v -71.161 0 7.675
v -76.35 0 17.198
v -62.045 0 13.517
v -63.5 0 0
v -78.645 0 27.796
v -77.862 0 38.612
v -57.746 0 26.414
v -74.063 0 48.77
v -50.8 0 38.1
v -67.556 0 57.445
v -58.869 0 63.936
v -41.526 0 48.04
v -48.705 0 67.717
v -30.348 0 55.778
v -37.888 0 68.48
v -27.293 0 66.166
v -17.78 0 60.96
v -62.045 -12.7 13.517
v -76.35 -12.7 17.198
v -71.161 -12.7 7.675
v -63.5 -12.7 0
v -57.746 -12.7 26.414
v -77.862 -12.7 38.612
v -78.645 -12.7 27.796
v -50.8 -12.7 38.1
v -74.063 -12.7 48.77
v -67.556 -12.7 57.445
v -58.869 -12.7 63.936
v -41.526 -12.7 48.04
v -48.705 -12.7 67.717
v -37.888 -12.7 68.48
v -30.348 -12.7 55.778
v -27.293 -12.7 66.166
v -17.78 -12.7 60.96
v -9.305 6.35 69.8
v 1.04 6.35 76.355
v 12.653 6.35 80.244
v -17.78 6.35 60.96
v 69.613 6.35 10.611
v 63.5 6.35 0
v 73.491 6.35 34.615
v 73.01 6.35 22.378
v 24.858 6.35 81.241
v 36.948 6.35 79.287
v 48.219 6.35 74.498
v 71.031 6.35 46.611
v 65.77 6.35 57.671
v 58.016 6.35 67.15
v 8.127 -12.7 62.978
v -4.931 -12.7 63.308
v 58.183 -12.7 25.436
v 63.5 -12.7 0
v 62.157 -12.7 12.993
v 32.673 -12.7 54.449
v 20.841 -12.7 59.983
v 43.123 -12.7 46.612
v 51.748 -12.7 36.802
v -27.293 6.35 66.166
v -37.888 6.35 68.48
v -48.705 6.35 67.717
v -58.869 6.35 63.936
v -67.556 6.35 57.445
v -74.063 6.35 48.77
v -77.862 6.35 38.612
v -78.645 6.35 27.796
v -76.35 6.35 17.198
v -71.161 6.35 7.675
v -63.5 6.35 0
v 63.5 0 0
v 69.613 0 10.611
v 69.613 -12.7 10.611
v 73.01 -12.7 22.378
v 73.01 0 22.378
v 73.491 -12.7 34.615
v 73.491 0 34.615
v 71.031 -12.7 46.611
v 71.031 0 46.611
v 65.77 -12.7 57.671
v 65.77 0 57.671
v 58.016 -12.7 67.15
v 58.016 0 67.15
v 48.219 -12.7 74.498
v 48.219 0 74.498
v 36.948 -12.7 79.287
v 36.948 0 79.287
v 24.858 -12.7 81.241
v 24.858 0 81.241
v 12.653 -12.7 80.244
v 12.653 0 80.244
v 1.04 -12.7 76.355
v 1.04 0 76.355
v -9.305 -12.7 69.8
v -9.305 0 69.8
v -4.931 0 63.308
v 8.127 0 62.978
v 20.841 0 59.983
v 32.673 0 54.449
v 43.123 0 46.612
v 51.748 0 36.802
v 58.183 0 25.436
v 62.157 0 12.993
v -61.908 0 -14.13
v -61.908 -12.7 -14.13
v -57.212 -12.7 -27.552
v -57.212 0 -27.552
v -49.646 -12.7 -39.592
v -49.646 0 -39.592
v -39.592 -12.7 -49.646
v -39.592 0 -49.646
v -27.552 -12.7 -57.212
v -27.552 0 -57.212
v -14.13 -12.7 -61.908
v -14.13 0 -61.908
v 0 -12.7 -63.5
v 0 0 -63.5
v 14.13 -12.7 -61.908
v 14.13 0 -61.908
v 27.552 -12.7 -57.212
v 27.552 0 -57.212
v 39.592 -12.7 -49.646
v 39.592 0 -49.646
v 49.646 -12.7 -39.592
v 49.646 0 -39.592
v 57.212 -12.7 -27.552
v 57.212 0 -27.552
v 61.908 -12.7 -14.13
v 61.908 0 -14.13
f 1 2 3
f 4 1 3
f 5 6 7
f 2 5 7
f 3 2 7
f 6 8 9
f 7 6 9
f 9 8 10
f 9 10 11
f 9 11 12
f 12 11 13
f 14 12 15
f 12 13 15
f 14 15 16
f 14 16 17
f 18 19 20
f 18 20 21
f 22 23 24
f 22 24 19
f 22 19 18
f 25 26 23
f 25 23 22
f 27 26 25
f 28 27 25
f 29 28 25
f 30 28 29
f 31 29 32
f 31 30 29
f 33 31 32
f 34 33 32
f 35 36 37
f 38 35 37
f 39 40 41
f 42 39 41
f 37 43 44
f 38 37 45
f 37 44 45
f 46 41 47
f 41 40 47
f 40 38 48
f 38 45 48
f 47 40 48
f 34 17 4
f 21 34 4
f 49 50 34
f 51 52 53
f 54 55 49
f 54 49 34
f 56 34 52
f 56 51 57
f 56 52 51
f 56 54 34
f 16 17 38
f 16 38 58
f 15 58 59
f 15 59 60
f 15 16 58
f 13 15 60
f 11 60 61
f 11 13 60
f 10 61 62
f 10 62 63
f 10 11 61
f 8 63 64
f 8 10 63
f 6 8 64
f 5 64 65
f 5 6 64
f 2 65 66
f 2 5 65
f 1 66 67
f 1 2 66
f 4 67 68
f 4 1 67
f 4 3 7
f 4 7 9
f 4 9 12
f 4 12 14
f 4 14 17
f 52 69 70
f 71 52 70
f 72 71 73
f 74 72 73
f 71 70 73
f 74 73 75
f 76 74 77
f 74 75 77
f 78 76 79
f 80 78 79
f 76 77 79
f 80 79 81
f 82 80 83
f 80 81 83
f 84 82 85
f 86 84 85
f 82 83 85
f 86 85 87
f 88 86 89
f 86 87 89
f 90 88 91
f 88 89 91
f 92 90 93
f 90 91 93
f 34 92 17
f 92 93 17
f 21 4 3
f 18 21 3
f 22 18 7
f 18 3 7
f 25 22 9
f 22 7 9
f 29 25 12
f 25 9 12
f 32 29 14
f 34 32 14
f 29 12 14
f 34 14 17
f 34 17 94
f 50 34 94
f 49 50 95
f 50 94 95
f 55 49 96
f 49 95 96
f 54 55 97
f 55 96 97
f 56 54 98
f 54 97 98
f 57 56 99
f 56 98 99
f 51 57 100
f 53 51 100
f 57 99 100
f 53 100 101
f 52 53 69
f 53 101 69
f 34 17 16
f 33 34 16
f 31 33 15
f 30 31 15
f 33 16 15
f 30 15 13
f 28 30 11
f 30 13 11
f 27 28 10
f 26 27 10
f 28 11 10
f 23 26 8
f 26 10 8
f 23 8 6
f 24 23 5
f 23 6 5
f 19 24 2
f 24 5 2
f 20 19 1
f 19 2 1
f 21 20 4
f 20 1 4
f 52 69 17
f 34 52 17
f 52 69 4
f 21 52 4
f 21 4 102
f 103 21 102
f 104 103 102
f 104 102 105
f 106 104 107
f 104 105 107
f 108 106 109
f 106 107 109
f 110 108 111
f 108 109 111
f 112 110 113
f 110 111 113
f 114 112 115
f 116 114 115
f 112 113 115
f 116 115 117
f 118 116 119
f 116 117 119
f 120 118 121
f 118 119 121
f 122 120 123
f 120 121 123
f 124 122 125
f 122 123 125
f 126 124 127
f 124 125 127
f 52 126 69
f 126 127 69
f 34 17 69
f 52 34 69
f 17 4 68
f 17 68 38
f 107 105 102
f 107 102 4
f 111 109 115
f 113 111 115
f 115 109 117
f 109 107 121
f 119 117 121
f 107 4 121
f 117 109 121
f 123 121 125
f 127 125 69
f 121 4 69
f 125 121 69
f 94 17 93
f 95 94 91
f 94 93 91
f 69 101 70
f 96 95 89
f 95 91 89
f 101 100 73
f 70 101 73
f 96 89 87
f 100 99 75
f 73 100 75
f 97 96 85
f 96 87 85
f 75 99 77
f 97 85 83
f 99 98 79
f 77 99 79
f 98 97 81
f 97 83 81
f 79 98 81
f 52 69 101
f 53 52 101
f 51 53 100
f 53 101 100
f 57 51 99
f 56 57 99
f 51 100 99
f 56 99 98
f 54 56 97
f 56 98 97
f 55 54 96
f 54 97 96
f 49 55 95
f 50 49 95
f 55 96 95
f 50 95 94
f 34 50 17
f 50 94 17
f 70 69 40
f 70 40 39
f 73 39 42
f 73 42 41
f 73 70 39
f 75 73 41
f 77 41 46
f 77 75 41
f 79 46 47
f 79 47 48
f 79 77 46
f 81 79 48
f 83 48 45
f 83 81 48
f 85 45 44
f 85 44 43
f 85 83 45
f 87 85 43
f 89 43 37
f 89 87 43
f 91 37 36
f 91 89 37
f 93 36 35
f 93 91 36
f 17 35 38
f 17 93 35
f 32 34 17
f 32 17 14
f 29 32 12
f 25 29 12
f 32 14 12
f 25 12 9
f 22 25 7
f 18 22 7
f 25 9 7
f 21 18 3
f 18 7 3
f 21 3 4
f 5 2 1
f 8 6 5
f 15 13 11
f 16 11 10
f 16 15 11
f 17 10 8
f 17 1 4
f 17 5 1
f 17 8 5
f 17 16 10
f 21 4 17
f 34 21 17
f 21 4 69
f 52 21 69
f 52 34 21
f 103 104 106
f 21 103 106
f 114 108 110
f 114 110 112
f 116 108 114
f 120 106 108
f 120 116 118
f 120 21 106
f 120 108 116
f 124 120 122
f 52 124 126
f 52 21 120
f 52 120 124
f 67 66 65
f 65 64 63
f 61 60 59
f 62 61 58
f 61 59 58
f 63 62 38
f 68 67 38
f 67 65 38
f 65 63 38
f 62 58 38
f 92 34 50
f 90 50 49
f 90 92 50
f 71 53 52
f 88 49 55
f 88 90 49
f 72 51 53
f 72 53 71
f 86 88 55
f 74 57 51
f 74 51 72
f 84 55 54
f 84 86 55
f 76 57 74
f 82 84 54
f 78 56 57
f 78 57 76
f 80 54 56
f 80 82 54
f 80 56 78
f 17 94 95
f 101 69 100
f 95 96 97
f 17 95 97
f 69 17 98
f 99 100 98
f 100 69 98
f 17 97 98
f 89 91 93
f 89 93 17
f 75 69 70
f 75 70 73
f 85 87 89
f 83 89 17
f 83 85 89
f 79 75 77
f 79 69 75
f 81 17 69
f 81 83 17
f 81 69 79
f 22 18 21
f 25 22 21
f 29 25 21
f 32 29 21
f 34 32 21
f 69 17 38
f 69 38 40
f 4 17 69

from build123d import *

# Parameters (mm, degrees)
F1_DEPTH = 12.7
F2_DEPTH = 12.7
F3_DEPTH = 6.35


with BuildPart() as f1:
    # F0 (on Front) → F1 (new body)
    with BuildSketch(Plane.XZ):
        Polygon((-63.5, 0), (63.5, 0), (-17.78, 60.96), align=None)
        with BuildLine():
            ThreePointArc((-17.78, 60.96), (38.1, 50.8), (63.5, 0))
            ThreePointArc((63.5, 0), (53.34, 71.12), (-17.78, 60.96))
        make_face()
        with BuildLine():
            ThreePointArc((-63.5, 0), (-50.8, 38.1), (-17.78, 60.96))
            ThreePointArc((-17.78, 60.96), (-71.12, 53.34), (-63.5, 0))
        make_face()
    extrude(amount=F1_DEPTH)


with BuildPart() as f2:
    # F0 (on Front) → F2 (new body)
    with BuildSketch(Plane.XZ):
        with BuildLine():
            ThreePointArc((-63.5, 0), (0, -63.5), (63.5, 0))
            Line((63.5, 0), (-63.5, 0))
        make_face()
        with BuildLine():
            Line((-17.78, 60.96), (63.5, 0))
            ThreePointArc((63.5, 0), (38.1, 50.8), (-17.78, 60.96))
        make_face()
        with BuildLine():
            Line((-63.5, 0), (-17.78, 60.96))
            ThreePointArc((-17.78, 60.96), (-50.8, 38.1), (-63.5, 0))
        make_face()
    extrude(amount=F2_DEPTH)


with BuildPart() as f3:
    # F0 (on Front) → F3 (new body)
    with BuildSketch(Plane.XZ):
        with BuildLine():
            Line((-63.5, 0), (-17.78, 60.96))
            ThreePointArc((-17.78, 60.96), (-50.8, 38.1), (-63.5, 0))
        make_face()
        with BuildLine():
            ThreePointArc((-63.5, 0), (-50.8, 38.1), (-17.78, 60.96))
            ThreePointArc((-17.78, 60.96), (-71.12, 53.34), (-63.5, 0))
        make_face()
        with BuildLine():
            Line((-17.78, 60.96), (63.5, 0))
            ThreePointArc((63.5, 0), (38.1, 50.8), (-17.78, 60.96))
        make_face()
        with BuildLine():
            ThreePointArc((-17.78, 60.96), (38.1, 50.8), (63.5, 0))
            ThreePointArc((63.5, 0), (53.34, 71.12), (-17.78, 60.96))
        make_face()
    extrude(amount=-F3_DEPTH)


solid = Compound([f1.part, f2.part, f3.part])
